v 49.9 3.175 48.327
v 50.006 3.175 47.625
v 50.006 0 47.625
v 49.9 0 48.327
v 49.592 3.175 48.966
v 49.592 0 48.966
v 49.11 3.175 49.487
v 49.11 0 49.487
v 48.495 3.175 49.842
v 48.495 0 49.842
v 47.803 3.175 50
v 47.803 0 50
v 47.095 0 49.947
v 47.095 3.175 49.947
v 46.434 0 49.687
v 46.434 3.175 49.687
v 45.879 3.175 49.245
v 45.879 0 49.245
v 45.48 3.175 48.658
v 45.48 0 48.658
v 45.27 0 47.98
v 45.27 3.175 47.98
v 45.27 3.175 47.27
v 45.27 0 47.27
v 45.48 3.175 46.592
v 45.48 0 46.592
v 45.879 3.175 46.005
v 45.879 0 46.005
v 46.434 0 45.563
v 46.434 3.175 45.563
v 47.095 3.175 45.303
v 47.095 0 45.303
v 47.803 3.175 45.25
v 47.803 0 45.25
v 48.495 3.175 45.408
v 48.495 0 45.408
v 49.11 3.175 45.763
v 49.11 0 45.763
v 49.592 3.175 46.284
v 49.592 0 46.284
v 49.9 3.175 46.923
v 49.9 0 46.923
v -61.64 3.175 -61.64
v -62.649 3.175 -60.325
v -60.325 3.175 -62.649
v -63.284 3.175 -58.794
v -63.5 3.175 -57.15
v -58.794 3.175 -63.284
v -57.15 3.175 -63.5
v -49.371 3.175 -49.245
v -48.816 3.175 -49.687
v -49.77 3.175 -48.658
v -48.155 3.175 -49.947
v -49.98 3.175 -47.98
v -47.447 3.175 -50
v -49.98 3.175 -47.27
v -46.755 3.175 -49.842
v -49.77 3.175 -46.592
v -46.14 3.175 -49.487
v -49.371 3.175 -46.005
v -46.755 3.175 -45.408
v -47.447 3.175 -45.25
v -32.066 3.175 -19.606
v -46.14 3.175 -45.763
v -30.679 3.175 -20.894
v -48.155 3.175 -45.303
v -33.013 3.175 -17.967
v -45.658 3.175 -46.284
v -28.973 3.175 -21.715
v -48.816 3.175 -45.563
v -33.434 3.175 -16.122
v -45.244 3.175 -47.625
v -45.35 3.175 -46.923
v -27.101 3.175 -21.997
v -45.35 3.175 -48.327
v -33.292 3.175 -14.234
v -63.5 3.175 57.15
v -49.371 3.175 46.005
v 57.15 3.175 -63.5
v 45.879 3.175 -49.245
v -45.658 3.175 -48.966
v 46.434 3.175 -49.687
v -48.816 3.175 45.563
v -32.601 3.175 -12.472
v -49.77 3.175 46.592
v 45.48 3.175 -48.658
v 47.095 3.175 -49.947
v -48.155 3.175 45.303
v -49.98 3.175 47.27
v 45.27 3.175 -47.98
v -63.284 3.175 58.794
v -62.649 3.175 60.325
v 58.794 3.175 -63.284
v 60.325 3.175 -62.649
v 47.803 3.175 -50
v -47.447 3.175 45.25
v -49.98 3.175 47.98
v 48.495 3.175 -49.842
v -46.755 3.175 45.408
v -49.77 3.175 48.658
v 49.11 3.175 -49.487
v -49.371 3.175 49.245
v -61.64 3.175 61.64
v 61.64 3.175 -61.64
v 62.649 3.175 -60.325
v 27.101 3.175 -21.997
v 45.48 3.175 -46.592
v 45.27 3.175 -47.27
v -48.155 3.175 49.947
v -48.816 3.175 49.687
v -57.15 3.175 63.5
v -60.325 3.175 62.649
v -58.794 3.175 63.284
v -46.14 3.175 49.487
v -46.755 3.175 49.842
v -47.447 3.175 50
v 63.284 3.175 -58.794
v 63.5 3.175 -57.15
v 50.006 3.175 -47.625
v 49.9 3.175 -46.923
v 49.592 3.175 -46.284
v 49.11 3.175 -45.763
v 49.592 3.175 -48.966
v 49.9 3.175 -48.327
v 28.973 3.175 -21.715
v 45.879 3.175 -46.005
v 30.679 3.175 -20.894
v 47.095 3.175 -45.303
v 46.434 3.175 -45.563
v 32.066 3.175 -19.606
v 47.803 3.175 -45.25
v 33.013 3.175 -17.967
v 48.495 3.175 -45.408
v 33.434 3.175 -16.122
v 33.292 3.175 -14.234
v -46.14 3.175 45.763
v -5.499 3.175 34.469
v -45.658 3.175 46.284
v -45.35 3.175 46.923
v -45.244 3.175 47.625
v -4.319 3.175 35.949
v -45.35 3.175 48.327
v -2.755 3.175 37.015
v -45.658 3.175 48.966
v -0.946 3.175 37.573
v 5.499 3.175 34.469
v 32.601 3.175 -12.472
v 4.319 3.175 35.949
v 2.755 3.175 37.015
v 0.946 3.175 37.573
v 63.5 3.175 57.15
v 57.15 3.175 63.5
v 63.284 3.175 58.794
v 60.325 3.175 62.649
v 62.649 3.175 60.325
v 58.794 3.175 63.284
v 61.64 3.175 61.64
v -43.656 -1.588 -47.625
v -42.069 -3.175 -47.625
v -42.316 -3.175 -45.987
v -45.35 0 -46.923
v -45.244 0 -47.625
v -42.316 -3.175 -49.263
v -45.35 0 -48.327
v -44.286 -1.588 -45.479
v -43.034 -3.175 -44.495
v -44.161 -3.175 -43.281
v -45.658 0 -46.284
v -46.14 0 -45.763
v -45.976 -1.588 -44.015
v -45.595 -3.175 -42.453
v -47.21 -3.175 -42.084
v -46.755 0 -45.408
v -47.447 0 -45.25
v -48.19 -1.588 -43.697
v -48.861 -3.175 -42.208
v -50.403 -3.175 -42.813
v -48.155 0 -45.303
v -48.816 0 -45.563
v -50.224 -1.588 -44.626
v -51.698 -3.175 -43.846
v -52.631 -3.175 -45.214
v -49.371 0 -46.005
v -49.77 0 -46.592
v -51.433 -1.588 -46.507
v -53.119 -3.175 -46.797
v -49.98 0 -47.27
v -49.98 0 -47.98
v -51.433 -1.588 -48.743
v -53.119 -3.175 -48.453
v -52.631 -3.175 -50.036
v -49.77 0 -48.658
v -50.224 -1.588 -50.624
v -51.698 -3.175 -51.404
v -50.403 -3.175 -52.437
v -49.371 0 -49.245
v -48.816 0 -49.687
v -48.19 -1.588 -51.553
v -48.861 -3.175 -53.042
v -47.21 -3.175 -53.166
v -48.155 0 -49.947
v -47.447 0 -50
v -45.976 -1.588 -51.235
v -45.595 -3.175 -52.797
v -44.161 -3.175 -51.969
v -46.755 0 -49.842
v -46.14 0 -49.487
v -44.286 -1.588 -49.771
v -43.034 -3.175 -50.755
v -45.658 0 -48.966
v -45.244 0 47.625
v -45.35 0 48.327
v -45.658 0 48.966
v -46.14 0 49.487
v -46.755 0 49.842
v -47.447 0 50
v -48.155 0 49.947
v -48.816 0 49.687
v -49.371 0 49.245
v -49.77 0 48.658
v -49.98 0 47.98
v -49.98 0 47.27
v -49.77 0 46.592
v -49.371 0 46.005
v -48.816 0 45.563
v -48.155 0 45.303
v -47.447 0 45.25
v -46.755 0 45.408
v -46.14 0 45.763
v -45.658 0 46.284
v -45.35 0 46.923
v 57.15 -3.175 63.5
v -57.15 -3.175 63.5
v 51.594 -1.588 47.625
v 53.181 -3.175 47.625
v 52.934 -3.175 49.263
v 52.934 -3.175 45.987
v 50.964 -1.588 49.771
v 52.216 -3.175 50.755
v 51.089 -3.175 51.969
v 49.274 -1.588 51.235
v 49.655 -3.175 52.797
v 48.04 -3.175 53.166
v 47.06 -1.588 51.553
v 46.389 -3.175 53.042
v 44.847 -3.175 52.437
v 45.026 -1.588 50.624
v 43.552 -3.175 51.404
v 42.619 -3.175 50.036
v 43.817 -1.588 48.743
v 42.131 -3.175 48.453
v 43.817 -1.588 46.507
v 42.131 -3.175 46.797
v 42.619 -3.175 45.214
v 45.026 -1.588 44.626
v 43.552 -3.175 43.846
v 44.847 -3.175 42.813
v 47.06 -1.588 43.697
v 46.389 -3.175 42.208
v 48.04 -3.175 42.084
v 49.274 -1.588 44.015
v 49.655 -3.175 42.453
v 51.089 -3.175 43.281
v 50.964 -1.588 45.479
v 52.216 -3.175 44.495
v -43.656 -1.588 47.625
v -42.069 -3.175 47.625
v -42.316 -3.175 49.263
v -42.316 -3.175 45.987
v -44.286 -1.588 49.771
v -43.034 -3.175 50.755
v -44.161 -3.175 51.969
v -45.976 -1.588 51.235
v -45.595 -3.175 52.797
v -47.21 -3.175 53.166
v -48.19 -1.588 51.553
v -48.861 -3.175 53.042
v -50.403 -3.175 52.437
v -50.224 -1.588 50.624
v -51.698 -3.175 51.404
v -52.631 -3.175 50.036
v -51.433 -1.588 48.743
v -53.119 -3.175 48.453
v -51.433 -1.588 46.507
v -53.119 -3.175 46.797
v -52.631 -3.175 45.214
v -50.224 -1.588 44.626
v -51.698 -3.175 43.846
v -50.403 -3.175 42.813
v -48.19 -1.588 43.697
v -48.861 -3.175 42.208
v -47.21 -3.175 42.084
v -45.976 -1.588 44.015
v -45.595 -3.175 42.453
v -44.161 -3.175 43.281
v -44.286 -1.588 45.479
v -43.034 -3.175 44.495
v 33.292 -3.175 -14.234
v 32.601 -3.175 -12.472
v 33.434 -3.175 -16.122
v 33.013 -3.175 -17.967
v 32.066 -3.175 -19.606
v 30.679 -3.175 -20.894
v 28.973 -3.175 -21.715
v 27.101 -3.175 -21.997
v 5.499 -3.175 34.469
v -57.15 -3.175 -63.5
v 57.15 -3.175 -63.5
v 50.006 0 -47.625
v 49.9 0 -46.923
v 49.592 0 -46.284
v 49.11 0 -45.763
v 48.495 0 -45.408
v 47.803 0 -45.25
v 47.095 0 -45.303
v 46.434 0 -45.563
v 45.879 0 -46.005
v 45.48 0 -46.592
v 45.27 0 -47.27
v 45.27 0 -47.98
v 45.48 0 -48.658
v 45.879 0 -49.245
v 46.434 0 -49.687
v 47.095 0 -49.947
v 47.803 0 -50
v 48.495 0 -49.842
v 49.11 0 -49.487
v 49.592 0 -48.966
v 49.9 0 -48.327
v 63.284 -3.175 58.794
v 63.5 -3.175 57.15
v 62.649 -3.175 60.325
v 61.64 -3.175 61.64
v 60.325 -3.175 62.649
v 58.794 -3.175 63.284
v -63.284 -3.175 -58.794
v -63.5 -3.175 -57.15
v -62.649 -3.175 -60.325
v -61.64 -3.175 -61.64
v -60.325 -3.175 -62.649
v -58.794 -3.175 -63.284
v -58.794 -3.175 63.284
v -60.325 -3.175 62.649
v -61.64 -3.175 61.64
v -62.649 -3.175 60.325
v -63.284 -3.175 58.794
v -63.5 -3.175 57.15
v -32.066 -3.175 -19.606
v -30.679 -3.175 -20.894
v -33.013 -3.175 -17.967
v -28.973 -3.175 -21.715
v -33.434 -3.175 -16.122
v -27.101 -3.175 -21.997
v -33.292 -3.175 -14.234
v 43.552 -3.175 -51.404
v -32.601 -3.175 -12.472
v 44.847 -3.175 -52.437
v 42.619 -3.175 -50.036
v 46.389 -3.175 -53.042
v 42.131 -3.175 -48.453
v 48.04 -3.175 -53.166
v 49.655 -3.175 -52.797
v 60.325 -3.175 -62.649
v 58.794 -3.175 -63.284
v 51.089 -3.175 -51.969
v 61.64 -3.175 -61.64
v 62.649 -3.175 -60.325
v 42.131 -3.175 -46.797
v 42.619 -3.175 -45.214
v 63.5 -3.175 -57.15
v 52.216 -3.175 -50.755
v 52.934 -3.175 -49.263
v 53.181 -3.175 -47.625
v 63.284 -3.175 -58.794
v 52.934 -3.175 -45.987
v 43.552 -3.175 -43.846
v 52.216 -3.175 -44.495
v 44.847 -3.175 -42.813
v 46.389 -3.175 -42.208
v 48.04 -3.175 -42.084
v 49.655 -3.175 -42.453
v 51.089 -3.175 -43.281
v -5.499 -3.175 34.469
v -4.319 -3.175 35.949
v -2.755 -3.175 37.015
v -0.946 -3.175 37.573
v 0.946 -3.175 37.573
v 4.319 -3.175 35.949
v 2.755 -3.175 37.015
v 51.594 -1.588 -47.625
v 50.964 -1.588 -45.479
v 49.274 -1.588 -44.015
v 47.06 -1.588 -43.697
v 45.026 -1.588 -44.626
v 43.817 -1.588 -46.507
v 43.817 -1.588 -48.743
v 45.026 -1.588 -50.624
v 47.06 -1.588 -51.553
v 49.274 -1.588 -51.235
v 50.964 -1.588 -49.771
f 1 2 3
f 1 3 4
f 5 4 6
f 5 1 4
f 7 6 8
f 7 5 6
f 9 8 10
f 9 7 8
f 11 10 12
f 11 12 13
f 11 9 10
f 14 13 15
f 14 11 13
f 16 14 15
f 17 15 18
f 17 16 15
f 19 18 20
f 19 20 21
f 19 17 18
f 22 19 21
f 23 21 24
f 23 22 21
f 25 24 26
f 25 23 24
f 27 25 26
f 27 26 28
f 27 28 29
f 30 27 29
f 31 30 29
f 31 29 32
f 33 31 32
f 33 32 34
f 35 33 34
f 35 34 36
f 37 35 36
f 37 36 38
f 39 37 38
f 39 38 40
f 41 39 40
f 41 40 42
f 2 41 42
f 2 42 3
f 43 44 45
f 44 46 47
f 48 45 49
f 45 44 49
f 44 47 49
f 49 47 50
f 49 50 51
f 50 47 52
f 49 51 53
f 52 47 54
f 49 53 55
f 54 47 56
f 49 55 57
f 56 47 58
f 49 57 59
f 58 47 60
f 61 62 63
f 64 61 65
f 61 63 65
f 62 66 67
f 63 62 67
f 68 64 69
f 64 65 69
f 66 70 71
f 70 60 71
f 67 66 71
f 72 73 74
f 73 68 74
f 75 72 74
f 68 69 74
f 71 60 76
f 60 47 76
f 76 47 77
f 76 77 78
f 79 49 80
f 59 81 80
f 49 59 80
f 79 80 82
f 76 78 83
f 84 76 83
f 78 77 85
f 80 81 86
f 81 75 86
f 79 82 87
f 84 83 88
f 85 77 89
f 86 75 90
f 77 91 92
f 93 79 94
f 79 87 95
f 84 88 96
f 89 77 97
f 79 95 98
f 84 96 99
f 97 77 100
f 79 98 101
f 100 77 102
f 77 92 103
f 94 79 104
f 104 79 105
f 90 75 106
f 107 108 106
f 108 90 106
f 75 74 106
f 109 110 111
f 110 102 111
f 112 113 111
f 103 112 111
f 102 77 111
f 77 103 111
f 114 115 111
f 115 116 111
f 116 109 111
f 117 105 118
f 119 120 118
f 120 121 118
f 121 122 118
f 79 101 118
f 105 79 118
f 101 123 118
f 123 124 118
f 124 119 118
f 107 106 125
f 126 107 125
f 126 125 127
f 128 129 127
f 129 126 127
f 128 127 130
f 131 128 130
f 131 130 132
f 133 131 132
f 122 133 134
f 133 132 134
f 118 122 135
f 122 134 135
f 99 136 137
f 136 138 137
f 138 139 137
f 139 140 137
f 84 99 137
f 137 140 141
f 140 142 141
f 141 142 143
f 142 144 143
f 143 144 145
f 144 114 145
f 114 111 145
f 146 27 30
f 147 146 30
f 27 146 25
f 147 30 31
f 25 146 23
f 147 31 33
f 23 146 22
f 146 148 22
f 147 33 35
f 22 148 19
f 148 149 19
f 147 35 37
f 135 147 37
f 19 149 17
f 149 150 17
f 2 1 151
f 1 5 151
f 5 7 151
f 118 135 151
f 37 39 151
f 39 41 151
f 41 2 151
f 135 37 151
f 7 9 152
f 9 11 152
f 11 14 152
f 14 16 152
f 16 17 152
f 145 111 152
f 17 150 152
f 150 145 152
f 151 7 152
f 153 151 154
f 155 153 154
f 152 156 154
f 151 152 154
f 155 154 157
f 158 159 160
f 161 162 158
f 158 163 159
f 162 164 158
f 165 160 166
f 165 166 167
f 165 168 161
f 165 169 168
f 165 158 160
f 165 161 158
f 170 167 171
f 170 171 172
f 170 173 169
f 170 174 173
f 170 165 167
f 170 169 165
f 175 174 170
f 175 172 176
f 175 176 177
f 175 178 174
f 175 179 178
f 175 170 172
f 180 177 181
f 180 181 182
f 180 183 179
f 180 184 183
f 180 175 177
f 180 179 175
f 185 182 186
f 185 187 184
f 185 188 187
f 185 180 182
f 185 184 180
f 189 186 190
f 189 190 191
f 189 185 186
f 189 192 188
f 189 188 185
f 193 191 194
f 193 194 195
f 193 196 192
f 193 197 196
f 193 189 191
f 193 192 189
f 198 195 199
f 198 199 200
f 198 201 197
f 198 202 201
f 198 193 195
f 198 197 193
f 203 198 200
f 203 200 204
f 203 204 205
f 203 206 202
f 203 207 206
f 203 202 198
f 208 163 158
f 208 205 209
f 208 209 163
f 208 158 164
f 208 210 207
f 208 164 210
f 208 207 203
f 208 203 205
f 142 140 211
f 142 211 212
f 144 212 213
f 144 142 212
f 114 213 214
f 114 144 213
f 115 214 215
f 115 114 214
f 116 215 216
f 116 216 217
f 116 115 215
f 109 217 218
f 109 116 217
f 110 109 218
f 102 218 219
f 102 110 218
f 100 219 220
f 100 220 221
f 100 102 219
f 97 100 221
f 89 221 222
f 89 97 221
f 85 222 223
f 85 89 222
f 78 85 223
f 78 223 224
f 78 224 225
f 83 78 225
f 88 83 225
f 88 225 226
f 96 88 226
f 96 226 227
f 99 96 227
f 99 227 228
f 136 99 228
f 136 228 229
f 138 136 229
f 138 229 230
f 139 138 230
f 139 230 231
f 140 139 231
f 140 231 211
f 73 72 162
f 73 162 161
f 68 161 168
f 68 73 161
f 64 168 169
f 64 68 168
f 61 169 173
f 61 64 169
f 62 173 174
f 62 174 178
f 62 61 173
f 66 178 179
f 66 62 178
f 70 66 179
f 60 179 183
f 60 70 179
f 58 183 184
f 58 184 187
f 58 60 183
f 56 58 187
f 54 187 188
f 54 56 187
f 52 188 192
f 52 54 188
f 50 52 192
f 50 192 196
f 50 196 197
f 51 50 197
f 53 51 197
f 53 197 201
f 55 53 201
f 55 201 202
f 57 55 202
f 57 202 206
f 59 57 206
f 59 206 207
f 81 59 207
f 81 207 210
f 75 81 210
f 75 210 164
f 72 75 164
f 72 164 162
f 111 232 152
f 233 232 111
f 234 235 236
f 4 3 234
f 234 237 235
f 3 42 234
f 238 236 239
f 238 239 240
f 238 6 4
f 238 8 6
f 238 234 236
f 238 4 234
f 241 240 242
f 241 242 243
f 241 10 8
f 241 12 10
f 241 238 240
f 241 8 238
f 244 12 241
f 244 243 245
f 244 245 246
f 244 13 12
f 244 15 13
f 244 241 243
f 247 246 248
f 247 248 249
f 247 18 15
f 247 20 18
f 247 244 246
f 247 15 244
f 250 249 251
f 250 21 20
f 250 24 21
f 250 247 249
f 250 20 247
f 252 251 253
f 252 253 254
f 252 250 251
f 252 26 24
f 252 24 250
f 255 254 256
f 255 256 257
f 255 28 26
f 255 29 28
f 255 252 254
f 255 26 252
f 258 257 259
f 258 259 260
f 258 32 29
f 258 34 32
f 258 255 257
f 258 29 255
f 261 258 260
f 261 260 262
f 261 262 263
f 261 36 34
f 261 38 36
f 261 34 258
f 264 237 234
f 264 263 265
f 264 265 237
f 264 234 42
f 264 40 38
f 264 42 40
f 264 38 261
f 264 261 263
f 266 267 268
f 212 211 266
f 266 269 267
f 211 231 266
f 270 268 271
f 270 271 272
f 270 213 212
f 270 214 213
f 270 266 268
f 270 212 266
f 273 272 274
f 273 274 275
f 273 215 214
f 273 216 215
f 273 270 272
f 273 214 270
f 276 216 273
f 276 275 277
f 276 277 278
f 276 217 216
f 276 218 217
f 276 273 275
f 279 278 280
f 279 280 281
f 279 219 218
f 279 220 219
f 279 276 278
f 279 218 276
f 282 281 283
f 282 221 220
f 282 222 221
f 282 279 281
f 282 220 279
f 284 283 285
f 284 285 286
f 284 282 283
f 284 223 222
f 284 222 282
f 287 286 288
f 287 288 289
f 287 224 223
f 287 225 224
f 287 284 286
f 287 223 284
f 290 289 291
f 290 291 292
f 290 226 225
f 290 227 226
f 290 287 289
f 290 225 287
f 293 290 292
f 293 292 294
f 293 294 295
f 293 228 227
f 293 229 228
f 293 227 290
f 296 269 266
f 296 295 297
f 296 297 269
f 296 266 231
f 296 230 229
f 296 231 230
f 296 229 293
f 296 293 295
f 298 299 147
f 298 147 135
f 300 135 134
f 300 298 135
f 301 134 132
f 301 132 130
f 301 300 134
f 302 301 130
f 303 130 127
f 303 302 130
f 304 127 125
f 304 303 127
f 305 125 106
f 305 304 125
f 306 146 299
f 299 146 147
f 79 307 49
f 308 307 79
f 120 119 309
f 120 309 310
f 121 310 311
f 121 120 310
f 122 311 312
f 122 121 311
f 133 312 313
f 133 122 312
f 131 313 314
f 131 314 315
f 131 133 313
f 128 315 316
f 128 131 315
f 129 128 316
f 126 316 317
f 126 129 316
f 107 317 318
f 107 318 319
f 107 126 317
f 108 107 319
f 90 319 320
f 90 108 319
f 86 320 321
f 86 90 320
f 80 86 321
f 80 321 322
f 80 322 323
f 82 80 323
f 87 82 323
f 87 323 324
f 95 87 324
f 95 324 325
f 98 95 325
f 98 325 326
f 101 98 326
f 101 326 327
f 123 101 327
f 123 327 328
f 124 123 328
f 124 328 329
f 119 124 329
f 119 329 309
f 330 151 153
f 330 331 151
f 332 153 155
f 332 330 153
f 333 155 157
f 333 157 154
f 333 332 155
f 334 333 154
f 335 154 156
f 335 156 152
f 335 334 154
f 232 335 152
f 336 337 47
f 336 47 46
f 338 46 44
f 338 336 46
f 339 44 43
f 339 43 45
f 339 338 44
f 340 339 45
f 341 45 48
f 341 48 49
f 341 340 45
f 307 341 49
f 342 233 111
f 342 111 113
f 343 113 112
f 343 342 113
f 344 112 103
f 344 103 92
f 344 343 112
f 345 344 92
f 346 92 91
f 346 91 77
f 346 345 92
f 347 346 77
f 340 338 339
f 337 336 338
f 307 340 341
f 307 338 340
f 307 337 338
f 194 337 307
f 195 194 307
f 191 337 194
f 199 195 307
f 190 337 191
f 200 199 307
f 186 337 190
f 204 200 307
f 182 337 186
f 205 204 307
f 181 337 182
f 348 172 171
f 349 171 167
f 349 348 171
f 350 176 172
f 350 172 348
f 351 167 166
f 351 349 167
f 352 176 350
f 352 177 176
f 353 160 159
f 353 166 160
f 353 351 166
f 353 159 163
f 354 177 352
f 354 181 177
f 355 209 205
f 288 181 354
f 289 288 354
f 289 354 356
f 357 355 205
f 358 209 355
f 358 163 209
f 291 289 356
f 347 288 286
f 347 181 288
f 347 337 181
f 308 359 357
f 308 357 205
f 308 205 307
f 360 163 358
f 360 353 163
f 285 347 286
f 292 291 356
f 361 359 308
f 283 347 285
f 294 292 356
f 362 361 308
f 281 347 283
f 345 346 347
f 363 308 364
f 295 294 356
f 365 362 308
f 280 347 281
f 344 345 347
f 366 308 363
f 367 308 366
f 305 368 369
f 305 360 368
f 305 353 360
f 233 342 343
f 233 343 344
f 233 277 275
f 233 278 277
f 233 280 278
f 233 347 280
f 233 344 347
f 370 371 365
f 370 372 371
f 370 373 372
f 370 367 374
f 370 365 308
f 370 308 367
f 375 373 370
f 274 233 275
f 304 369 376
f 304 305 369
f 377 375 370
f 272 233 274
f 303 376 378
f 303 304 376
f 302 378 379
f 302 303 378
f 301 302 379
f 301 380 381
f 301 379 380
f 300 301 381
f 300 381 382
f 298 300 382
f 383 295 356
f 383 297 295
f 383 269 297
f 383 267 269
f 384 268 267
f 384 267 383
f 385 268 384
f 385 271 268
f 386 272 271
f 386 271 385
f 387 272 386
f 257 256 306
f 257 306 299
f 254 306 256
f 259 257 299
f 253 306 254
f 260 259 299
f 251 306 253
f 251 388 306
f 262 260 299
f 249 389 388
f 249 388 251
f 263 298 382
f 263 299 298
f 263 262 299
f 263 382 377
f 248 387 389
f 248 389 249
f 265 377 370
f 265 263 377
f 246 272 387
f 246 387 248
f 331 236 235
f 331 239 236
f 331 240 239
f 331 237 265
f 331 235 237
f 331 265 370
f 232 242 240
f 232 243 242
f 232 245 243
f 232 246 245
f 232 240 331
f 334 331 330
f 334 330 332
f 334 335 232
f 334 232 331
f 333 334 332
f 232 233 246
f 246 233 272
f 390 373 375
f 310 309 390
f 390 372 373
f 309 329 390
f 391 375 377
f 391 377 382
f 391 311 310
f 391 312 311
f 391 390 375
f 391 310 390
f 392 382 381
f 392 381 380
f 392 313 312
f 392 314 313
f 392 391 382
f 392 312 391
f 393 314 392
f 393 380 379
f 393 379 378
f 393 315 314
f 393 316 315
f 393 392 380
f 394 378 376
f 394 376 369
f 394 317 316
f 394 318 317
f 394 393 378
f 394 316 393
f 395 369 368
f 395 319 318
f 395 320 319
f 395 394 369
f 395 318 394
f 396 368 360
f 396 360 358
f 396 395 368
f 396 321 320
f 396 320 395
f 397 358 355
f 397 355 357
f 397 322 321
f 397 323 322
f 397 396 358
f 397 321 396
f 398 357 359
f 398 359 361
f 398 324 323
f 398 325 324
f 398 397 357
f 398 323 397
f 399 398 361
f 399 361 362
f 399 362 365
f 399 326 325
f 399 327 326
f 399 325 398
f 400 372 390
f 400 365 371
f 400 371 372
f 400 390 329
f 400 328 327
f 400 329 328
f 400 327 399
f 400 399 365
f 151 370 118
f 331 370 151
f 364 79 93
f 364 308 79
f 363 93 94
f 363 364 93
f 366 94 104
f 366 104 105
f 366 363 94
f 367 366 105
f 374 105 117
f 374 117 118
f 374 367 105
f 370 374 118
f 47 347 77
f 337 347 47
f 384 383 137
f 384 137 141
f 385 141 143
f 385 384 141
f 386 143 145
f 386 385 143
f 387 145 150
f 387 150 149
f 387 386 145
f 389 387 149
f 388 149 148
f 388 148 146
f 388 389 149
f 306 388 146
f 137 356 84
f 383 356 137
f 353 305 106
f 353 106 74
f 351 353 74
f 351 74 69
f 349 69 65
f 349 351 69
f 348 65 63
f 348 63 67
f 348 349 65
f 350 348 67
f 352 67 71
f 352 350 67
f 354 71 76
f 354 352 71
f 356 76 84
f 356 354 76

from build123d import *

# Parameters (mm, degrees)
F0_R     = 2.38125
F1_DEPTH = 3.175
F2_SIZE  = 3.175


with BuildPart() as f1:
    # F0 (on Front) → F1 (new body, symmetric)
    with BuildSketch(Plane.XZ):
        with BuildLine():
            Line((57.15, 63.5), (-57.15, 63.5))
            ThreePointArc((-57.15, 63.5), (-61.640128, 61.640128), (-63.5, 57.15))
            Line((-63.5, 57.15), (-63.5, -57.15))
            ThreePointArc((-63.5, -57.15), (-61.640128, -61.640128), (-57.15, -63.5))
            Line((-57.15, -63.5), (57.15, -63.5))
            ThreePointArc((57.15, -63.5), (61.640128, -61.640128), (63.5, -57.15))
            Line((63.5, -57.15), (63.5, 57.15))
            ThreePointArc((63.5, 57.15), (61.640128, 61.640128), (57.15, 63.5))
        make_face()
        with Locations((-47.625, -47.625)):
            Circle(F0_R, mode=Mode.SUBTRACT)
        with Locations((47.625, -47.625)):
            Circle(F0_R, mode=Mode.SUBTRACT)
        with Locations((-47.625, 47.625)):
            Circle(F0_R, mode=Mode.SUBTRACT)
        with BuildLine():
            Line((-32.600739, -12.472045), (-5.499261, 34.469091))
            ThreePointArc((-5.499261, 34.469091), (0, 37.644091), (5.499261, 34.469091))
            Line((5.499261, 34.469091), (32.600739, -12.472045))
            ThreePointArc((32.600739, -12.472045), (32.600739, -18.822045), (27.101477, -21.997045))
            Line((27.101477, -21.997045), (-27.101477, -21.997045))
            ThreePointArc((-27.101477, -21.997045), (-32.600739, -18.822045), (-32.600739, -12.472045))
        make_face(mode=Mode.SUBTRACT)
        with Locations((47.625, 47.625)):
            Circle(F0_R, mode=Mode.SUBTRACT)
    extrude(amount=F1_DEPTH, both=True)

    # F2
    f2_edges = [f1.edges().sort_by_distance(p)[0] for p in [
        (-50.00625, -3.175, 47.625),
        (-50.00625, -3.175, -47.625),
        (45.24375, -3.175, -47.625),
        (45.24375, -3.175, 47.625),
    ]]
    chamfer(f2_edges, length=F2_SIZE)


solid = f1.part
